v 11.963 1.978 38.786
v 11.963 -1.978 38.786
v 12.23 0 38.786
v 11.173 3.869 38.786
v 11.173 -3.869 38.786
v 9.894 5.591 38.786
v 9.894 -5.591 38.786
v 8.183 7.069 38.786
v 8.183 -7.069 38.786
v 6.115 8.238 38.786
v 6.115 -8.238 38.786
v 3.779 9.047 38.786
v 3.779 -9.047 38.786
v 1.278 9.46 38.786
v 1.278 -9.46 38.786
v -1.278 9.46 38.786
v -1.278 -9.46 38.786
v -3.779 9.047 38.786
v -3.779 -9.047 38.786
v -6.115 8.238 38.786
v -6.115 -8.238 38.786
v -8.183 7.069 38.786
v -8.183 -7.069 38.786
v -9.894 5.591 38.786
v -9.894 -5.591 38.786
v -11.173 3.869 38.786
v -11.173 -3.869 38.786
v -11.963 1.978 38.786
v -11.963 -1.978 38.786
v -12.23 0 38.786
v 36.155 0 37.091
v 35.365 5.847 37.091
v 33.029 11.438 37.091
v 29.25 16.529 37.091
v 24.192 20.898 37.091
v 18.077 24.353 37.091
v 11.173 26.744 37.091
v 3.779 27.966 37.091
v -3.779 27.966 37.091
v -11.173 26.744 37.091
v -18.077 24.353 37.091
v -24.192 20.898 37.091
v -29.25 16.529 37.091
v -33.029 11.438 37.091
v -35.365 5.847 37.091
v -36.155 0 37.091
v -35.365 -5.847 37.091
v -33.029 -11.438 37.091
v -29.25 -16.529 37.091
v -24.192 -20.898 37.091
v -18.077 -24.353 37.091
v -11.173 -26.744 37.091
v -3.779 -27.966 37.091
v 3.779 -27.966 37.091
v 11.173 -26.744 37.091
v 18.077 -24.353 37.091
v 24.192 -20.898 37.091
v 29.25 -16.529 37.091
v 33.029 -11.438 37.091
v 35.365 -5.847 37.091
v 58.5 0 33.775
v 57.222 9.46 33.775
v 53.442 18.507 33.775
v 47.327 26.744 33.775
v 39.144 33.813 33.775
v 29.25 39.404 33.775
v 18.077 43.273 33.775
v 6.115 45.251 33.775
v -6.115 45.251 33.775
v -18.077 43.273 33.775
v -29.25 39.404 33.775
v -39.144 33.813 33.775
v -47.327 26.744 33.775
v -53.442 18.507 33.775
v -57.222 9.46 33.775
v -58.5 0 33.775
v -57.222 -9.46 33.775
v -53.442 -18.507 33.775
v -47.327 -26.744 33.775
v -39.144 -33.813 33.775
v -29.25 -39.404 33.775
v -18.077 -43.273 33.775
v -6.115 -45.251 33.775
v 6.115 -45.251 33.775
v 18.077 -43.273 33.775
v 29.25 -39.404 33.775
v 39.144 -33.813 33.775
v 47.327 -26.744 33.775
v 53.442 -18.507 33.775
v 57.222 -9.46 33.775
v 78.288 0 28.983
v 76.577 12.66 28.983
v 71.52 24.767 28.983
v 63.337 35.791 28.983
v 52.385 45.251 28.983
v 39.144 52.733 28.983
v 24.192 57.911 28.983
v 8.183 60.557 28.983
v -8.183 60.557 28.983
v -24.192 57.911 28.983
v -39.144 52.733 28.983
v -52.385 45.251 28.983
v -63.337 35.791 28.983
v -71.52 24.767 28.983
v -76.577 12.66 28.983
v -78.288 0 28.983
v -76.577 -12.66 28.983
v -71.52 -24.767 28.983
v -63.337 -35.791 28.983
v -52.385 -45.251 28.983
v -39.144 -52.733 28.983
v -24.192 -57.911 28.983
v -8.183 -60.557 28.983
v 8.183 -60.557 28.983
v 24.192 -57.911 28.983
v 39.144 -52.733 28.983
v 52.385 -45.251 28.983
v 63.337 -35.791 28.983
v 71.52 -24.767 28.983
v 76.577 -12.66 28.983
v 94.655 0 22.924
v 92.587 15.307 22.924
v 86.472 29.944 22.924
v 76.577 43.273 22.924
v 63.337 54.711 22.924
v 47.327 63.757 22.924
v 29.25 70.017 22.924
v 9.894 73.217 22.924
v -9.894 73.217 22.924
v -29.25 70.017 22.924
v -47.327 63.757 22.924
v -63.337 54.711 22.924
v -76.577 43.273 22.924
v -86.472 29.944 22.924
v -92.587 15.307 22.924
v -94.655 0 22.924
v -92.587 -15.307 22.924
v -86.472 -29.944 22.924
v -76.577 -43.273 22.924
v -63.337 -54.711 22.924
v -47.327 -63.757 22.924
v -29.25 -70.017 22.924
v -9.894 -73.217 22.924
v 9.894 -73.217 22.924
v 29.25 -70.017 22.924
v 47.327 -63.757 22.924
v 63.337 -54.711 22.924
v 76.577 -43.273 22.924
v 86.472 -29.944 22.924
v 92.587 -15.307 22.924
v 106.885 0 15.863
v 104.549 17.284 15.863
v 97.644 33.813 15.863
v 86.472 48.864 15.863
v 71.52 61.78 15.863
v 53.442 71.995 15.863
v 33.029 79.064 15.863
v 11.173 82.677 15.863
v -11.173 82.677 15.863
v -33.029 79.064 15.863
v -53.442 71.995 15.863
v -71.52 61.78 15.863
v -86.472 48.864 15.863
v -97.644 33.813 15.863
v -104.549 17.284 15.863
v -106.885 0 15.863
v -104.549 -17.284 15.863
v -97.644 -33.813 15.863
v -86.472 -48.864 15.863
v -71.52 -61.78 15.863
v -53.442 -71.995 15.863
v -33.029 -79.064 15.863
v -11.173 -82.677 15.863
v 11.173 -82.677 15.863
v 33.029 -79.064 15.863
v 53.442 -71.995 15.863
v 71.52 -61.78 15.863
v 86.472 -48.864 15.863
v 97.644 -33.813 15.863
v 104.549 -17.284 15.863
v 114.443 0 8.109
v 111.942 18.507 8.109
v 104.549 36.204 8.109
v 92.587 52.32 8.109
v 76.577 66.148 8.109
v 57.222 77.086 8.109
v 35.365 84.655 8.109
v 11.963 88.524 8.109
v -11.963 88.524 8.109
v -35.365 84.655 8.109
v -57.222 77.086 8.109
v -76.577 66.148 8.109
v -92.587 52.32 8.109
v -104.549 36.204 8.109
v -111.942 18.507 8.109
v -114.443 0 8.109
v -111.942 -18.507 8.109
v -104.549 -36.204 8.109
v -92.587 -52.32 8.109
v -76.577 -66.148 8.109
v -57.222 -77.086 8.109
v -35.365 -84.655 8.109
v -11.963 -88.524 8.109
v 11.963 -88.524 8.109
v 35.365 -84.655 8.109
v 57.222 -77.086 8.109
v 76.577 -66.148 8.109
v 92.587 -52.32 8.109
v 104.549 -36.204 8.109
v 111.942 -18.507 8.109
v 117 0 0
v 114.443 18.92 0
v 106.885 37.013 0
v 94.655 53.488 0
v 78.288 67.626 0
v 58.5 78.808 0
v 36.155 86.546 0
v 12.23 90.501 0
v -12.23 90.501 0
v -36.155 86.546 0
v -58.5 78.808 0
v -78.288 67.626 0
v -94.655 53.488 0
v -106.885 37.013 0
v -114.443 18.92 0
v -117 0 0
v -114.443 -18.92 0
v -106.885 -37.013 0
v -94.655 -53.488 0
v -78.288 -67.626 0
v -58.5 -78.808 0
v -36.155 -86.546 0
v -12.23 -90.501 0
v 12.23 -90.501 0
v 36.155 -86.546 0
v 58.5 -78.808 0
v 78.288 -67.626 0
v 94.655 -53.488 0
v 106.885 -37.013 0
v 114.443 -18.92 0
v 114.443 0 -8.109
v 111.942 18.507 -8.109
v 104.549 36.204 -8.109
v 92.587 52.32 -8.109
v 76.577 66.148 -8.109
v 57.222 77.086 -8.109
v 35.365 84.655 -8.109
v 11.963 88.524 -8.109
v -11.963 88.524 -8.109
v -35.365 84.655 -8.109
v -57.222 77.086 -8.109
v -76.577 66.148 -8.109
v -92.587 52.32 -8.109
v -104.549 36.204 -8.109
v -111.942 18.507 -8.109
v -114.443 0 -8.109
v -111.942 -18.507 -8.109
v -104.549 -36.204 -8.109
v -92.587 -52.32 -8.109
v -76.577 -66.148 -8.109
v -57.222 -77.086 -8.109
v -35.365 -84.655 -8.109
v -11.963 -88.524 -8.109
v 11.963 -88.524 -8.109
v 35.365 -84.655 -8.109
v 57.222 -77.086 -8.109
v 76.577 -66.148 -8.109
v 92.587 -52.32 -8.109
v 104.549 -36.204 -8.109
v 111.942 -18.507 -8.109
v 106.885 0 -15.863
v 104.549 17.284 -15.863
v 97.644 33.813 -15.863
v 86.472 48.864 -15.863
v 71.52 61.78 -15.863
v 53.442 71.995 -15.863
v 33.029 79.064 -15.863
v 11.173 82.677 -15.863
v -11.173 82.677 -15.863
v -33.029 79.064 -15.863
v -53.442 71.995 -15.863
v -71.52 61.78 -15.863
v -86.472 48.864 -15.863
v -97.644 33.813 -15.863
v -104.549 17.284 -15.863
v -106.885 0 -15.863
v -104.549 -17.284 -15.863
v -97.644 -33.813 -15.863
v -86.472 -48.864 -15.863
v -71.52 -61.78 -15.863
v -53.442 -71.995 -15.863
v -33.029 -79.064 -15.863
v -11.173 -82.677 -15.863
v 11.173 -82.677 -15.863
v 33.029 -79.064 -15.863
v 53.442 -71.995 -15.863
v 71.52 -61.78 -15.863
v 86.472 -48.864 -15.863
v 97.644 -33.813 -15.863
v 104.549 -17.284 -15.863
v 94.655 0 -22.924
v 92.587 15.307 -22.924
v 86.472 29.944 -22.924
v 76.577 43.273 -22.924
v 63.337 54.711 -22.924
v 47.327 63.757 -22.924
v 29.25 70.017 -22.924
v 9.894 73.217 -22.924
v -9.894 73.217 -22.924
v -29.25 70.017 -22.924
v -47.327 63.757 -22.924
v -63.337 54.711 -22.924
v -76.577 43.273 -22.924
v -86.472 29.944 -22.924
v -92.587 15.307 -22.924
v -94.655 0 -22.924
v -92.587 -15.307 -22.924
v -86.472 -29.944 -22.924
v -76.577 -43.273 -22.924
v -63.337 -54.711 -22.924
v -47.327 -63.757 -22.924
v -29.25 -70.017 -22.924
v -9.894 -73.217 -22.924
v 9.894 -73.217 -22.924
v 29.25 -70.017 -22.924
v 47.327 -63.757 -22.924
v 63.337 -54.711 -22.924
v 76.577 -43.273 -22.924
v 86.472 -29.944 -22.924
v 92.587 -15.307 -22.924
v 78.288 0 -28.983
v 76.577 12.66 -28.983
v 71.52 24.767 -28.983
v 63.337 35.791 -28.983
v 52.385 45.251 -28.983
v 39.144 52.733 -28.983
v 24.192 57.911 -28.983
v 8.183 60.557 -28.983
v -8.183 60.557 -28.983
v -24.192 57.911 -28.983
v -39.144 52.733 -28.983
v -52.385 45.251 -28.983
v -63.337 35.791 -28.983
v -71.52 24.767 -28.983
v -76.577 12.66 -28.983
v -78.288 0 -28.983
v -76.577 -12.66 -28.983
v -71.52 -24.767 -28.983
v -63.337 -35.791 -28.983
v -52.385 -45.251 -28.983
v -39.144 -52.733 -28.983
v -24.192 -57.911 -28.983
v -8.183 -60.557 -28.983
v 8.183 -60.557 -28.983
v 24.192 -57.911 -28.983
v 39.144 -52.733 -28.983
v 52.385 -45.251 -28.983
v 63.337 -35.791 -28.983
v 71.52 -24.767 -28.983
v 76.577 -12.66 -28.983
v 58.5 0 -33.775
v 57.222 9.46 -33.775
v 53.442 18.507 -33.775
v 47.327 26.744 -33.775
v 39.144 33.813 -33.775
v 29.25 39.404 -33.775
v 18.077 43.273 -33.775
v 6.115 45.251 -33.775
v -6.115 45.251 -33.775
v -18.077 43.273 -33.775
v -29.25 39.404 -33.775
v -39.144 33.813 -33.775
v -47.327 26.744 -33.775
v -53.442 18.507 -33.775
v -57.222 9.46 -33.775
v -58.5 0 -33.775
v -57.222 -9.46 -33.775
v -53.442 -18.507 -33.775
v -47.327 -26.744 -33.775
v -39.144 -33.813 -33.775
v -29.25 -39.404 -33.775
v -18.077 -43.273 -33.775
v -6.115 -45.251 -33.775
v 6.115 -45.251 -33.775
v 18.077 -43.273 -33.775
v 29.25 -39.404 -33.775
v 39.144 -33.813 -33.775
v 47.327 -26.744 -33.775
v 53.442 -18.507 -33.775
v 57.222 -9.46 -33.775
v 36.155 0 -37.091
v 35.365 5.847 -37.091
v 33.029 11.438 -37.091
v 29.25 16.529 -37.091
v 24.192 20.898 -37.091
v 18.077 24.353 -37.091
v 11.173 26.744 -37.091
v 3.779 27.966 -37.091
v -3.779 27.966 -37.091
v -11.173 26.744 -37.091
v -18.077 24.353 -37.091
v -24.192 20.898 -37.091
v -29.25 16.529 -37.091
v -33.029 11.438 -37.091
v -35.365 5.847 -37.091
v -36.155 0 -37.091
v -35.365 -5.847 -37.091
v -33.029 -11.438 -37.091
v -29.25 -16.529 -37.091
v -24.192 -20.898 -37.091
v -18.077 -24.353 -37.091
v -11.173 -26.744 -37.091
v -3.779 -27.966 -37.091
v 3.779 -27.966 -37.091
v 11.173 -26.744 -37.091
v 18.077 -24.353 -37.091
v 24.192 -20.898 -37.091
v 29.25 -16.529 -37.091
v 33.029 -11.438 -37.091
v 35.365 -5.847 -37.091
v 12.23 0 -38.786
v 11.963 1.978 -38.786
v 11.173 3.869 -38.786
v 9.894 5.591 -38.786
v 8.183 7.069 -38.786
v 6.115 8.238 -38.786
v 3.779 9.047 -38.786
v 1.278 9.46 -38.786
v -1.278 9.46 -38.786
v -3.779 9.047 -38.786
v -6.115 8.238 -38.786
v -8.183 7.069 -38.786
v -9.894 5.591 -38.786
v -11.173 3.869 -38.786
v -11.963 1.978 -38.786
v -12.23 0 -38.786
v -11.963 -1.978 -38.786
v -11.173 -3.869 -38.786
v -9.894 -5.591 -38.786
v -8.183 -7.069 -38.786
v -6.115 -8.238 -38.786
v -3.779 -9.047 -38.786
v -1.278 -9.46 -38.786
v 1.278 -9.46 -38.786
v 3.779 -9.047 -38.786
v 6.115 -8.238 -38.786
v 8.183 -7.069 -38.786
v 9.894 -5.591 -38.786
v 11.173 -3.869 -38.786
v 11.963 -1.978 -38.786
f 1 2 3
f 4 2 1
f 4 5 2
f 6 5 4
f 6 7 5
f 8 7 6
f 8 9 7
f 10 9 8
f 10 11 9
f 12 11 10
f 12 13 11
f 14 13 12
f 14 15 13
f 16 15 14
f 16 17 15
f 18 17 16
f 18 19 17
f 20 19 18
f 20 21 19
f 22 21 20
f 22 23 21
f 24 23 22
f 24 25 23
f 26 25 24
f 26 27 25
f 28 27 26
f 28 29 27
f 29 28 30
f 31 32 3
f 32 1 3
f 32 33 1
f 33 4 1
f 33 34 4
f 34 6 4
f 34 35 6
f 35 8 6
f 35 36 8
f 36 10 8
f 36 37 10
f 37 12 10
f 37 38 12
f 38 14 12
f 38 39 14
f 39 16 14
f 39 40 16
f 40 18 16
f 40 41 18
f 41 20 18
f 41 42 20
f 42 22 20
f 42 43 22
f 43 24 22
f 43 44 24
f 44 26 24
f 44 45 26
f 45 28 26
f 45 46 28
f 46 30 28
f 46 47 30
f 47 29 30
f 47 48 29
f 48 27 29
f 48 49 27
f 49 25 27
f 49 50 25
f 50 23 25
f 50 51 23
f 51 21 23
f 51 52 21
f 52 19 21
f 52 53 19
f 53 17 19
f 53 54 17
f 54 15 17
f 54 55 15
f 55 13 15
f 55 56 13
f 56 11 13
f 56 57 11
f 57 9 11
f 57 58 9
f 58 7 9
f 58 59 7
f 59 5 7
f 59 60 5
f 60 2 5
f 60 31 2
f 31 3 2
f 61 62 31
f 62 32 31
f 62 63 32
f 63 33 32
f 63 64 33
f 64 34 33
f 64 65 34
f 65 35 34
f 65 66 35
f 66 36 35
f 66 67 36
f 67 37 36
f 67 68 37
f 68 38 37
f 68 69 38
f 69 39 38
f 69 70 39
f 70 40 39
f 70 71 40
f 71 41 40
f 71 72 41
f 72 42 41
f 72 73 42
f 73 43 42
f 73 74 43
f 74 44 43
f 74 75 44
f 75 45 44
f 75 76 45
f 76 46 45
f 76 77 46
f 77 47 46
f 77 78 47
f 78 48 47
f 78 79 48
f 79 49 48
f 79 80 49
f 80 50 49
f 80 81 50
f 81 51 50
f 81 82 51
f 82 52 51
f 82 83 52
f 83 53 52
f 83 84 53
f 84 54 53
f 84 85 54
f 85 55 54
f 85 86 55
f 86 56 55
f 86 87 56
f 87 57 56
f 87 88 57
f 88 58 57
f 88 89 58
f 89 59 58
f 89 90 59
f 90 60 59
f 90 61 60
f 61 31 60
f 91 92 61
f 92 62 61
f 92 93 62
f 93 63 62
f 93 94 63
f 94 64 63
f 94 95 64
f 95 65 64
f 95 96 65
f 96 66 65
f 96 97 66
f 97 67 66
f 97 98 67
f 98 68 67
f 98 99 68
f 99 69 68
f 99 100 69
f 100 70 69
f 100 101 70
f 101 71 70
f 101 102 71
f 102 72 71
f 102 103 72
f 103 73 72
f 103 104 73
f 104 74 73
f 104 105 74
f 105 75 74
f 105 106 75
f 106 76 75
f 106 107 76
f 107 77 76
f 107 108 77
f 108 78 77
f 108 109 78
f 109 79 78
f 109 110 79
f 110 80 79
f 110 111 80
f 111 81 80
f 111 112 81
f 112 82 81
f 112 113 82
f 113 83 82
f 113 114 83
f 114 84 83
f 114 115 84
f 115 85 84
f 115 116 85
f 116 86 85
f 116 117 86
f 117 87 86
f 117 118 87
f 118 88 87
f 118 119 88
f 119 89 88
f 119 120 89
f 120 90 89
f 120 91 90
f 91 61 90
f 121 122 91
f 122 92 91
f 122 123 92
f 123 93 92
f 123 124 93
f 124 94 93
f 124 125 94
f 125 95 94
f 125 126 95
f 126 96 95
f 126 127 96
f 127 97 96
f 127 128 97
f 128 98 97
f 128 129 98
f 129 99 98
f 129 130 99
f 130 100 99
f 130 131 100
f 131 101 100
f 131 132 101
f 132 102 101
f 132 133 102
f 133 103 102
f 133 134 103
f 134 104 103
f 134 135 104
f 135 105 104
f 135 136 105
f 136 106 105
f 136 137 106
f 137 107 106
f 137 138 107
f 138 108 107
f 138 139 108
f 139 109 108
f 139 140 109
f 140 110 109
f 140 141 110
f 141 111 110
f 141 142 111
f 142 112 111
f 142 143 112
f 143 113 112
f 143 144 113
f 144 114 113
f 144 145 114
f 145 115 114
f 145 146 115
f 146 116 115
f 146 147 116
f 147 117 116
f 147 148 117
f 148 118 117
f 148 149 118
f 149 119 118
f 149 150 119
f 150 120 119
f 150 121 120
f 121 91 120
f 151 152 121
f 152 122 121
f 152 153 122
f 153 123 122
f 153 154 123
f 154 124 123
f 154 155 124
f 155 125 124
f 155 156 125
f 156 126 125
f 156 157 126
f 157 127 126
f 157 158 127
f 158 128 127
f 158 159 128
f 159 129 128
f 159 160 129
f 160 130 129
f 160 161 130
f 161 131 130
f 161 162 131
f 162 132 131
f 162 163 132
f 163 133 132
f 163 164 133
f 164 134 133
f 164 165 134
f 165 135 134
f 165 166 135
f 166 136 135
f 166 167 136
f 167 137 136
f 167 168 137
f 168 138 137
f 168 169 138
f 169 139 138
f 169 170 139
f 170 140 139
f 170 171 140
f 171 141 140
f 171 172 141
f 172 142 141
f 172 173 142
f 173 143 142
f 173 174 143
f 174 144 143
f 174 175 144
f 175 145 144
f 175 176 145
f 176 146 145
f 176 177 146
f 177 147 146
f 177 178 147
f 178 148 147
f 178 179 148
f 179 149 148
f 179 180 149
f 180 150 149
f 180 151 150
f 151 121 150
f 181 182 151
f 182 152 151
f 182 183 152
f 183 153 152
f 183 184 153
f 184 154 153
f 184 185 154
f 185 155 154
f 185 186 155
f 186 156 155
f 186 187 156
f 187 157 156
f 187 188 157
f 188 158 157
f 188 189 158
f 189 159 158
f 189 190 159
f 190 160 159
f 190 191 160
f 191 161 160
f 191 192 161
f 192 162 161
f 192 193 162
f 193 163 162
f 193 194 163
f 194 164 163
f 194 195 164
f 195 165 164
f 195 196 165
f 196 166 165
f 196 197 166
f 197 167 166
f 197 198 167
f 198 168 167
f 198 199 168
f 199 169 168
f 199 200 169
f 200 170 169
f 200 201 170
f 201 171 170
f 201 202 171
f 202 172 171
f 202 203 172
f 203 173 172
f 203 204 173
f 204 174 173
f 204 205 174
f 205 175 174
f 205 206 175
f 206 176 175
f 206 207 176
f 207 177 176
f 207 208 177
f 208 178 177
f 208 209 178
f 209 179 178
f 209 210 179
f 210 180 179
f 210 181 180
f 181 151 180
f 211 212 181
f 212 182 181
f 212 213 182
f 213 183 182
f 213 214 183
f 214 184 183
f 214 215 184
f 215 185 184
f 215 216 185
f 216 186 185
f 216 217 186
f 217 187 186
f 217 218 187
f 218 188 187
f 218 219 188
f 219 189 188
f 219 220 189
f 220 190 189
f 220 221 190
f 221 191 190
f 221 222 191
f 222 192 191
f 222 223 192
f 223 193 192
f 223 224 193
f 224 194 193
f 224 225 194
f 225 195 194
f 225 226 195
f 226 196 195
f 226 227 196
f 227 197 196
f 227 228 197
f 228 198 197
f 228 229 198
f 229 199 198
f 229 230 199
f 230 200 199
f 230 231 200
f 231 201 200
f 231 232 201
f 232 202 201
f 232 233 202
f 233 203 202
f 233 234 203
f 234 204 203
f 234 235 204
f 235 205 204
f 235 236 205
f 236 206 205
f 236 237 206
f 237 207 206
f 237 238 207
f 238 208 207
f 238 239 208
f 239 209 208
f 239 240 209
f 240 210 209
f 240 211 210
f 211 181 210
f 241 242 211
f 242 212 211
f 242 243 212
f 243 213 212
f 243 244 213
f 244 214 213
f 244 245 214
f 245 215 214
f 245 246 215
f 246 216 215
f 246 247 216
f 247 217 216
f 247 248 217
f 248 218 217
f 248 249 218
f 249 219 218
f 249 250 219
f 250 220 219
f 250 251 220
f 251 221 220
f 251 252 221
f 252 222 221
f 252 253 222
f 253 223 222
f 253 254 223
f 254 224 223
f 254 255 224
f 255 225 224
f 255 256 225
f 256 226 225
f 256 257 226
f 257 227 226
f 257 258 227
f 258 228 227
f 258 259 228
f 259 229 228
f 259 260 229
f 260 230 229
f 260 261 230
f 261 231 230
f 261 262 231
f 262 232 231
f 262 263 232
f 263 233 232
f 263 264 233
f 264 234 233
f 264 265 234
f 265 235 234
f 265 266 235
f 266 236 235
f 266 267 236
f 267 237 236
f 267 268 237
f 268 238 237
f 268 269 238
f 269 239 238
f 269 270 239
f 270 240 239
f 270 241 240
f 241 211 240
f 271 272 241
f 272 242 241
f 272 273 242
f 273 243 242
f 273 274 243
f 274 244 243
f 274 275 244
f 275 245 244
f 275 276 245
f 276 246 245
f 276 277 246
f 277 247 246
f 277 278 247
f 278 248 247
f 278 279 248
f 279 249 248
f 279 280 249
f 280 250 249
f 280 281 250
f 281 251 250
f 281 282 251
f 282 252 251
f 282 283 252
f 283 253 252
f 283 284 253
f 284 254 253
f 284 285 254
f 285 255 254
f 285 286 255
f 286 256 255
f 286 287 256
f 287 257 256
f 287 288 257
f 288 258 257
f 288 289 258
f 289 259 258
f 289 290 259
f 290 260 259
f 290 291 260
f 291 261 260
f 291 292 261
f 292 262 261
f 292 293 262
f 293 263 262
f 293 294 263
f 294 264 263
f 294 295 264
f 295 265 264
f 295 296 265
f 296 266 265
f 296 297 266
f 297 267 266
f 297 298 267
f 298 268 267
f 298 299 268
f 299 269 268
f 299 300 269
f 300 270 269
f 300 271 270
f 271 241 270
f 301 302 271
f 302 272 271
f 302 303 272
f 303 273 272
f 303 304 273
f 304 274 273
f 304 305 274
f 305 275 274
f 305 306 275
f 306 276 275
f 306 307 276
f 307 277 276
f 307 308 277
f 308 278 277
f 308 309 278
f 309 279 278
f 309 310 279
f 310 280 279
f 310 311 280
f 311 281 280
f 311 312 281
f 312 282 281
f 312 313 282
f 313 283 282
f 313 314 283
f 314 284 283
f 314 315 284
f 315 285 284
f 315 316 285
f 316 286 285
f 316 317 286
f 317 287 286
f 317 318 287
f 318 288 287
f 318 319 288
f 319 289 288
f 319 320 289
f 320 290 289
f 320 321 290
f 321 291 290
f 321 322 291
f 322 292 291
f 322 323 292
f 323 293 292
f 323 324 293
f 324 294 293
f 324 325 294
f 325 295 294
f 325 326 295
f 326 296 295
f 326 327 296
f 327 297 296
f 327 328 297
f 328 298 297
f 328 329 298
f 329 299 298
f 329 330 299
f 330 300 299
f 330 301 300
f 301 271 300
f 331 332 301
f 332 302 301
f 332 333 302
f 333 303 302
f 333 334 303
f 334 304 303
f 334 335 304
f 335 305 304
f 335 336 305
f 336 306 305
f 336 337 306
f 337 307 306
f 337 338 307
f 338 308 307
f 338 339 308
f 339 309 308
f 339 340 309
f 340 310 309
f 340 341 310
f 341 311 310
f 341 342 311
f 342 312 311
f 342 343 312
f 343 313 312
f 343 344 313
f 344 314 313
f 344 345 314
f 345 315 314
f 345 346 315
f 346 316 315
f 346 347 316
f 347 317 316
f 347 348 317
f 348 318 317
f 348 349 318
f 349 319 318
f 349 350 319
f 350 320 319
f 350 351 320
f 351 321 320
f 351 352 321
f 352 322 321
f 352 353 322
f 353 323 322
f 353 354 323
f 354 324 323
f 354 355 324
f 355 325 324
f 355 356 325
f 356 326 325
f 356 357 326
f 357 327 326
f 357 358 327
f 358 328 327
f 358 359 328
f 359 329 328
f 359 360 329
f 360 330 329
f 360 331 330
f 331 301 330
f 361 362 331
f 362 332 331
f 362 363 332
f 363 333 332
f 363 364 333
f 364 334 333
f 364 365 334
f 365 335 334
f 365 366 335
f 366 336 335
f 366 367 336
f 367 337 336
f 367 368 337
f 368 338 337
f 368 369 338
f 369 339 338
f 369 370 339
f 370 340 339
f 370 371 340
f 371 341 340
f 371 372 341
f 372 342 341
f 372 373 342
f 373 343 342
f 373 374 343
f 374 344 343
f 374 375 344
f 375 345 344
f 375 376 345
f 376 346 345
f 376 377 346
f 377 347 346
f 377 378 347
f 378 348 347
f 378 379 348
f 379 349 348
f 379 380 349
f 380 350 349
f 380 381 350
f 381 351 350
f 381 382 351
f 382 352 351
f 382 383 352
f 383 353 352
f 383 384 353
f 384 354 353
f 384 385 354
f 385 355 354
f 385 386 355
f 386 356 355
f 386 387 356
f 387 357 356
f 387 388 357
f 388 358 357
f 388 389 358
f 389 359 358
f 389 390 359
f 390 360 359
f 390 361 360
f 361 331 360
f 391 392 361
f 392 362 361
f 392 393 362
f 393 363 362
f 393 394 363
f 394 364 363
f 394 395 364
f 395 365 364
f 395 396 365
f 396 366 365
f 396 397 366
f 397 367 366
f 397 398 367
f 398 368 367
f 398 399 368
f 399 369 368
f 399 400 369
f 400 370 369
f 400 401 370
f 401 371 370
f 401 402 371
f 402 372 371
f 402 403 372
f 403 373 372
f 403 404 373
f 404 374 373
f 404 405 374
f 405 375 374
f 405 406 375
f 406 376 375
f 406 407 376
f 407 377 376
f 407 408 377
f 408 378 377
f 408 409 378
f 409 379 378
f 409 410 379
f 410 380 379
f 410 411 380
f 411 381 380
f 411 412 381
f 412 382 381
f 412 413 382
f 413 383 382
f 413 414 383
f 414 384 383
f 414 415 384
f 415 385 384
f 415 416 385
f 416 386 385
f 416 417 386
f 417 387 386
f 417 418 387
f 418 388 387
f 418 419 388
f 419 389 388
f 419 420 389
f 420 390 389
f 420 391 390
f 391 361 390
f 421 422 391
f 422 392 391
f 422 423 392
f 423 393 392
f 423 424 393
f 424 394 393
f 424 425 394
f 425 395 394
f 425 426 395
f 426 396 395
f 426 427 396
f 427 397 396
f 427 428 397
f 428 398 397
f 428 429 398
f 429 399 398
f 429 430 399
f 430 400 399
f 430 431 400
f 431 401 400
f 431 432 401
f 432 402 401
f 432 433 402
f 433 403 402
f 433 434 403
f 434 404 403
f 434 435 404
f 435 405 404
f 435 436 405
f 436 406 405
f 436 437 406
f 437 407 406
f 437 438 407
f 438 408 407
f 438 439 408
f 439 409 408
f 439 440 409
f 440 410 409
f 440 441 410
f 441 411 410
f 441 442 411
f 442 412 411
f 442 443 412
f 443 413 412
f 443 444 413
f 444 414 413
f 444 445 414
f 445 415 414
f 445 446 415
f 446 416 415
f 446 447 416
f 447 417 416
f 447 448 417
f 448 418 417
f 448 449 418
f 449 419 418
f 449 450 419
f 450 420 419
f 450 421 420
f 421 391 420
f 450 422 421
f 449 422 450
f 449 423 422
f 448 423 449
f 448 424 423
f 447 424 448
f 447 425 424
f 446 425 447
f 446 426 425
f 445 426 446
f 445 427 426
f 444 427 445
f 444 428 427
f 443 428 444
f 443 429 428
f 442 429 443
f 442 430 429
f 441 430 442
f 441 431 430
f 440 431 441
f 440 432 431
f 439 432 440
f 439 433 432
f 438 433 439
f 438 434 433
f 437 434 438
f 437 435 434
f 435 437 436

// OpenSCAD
// Generated by SolidPython 1.0.1 on 2020-07-29 00:46:48


scale(v = [9, 7, 3]) {
	sphere(r = 13);
}
/***********************************************
*********      SolidPython code:      **********
************************************************
 
# import packages: SolidPython
from solid import *
from solid.utils import *
from itertools import chain, combinations, permutations


class Resize:

    def __init__(self, scad_file):
        self.scad_file = scad_file
        #self.scad_file = import_scad(scad_file)
        # cone/cylinder param:
        self.r1 = 0
        self.r2 = 0
        self.h = 0
        # rectangular prism param:
        self.w = 0
        self.l = 0
        # ellipse param:
        self.r = 0

    # import OpenScad code (file name corresponds to shape)


    # classify shape + parameters
    def assign(self, param1, param2, param3):
        if self.scad_file == 'cone.scad':
            self.r1 = param1
            self.r2 = param2
            self.h = param3
        elif self.scad_file == 'cylinder.scad':
            self.r1 = param1
            self.r2 = param2
            self.h = param3
        elif self.scad_file == 'rectangularPrism.scad':
            self.h = param1
            self.l = param2
            self.w = param3
        else:
            self.r = param1
            self.h = param2

    # resize parameters
    def iterate(self):
        x = range(3, 20, 2)
        i = 1
        if self.scad_file == 'cone.scad':
            tempList = list(permutations(x, 2))
            for temp in tempList:
                param1 = temp[0]
                param2 = temp[1]
                filepath = 'produced_scad_files/' + 'cone' + str(param1) + '_' + str(param2) + '_' + '.scad'
                scad_render_to_file(cylinder(h=param1, r1=param2, r2=0), filepath)

        elif self.scad_file == 'cylinder.scad':
            tempList = list(permutations(x, 3))
            for temp in tempList:
                param1 = temp[0]
                param2 = temp[1]
                filepath = 'produced_scad_files/' + 'cylinder' + str(param1) + '_' + str(param2) + '_' + '.scad'
                scad_render_to_file(cylinder(h=param1, r1=param2, r2=param2), filepath)

        elif self.scad_file == 'rectangularPrism.scad':
            tempList = list(permutations(x, 3))
            for temp in tempList:
                param1 = temp[0]
                param2 = temp[1]
                param3 = temp[2]
                filepath = 'produced_scad_files/' + 'rectangularPrism' + str(param1) + '_' + str(param2) + '_' + str(
                    param3) + '.scad'
                scad_render_to_file(cube(size=(param1, param2, param3)), filepath)

        elif self.scad_file == 'ellipse.scad':
            tempList = list(permutations(x, 4))
            for temp in tempList:
                param1 = temp[0]
                param2 = temp[1]
                param3 = temp[2]
                param4 = temp[3]
                filepath = 'produced_scad_files/' + 'ellipse' + str(param1) + '_' + str(param2) + '_' + str(param3) + '_' + str(param4) + '.scad'
                scad_render_to_file(scale([param1, param2, param3])(sphere(r=param4)), filepath)

    def render_to_scadfile(self):
        scad_render_to_file(scad, 'example.scad') 
 
************************************************/
